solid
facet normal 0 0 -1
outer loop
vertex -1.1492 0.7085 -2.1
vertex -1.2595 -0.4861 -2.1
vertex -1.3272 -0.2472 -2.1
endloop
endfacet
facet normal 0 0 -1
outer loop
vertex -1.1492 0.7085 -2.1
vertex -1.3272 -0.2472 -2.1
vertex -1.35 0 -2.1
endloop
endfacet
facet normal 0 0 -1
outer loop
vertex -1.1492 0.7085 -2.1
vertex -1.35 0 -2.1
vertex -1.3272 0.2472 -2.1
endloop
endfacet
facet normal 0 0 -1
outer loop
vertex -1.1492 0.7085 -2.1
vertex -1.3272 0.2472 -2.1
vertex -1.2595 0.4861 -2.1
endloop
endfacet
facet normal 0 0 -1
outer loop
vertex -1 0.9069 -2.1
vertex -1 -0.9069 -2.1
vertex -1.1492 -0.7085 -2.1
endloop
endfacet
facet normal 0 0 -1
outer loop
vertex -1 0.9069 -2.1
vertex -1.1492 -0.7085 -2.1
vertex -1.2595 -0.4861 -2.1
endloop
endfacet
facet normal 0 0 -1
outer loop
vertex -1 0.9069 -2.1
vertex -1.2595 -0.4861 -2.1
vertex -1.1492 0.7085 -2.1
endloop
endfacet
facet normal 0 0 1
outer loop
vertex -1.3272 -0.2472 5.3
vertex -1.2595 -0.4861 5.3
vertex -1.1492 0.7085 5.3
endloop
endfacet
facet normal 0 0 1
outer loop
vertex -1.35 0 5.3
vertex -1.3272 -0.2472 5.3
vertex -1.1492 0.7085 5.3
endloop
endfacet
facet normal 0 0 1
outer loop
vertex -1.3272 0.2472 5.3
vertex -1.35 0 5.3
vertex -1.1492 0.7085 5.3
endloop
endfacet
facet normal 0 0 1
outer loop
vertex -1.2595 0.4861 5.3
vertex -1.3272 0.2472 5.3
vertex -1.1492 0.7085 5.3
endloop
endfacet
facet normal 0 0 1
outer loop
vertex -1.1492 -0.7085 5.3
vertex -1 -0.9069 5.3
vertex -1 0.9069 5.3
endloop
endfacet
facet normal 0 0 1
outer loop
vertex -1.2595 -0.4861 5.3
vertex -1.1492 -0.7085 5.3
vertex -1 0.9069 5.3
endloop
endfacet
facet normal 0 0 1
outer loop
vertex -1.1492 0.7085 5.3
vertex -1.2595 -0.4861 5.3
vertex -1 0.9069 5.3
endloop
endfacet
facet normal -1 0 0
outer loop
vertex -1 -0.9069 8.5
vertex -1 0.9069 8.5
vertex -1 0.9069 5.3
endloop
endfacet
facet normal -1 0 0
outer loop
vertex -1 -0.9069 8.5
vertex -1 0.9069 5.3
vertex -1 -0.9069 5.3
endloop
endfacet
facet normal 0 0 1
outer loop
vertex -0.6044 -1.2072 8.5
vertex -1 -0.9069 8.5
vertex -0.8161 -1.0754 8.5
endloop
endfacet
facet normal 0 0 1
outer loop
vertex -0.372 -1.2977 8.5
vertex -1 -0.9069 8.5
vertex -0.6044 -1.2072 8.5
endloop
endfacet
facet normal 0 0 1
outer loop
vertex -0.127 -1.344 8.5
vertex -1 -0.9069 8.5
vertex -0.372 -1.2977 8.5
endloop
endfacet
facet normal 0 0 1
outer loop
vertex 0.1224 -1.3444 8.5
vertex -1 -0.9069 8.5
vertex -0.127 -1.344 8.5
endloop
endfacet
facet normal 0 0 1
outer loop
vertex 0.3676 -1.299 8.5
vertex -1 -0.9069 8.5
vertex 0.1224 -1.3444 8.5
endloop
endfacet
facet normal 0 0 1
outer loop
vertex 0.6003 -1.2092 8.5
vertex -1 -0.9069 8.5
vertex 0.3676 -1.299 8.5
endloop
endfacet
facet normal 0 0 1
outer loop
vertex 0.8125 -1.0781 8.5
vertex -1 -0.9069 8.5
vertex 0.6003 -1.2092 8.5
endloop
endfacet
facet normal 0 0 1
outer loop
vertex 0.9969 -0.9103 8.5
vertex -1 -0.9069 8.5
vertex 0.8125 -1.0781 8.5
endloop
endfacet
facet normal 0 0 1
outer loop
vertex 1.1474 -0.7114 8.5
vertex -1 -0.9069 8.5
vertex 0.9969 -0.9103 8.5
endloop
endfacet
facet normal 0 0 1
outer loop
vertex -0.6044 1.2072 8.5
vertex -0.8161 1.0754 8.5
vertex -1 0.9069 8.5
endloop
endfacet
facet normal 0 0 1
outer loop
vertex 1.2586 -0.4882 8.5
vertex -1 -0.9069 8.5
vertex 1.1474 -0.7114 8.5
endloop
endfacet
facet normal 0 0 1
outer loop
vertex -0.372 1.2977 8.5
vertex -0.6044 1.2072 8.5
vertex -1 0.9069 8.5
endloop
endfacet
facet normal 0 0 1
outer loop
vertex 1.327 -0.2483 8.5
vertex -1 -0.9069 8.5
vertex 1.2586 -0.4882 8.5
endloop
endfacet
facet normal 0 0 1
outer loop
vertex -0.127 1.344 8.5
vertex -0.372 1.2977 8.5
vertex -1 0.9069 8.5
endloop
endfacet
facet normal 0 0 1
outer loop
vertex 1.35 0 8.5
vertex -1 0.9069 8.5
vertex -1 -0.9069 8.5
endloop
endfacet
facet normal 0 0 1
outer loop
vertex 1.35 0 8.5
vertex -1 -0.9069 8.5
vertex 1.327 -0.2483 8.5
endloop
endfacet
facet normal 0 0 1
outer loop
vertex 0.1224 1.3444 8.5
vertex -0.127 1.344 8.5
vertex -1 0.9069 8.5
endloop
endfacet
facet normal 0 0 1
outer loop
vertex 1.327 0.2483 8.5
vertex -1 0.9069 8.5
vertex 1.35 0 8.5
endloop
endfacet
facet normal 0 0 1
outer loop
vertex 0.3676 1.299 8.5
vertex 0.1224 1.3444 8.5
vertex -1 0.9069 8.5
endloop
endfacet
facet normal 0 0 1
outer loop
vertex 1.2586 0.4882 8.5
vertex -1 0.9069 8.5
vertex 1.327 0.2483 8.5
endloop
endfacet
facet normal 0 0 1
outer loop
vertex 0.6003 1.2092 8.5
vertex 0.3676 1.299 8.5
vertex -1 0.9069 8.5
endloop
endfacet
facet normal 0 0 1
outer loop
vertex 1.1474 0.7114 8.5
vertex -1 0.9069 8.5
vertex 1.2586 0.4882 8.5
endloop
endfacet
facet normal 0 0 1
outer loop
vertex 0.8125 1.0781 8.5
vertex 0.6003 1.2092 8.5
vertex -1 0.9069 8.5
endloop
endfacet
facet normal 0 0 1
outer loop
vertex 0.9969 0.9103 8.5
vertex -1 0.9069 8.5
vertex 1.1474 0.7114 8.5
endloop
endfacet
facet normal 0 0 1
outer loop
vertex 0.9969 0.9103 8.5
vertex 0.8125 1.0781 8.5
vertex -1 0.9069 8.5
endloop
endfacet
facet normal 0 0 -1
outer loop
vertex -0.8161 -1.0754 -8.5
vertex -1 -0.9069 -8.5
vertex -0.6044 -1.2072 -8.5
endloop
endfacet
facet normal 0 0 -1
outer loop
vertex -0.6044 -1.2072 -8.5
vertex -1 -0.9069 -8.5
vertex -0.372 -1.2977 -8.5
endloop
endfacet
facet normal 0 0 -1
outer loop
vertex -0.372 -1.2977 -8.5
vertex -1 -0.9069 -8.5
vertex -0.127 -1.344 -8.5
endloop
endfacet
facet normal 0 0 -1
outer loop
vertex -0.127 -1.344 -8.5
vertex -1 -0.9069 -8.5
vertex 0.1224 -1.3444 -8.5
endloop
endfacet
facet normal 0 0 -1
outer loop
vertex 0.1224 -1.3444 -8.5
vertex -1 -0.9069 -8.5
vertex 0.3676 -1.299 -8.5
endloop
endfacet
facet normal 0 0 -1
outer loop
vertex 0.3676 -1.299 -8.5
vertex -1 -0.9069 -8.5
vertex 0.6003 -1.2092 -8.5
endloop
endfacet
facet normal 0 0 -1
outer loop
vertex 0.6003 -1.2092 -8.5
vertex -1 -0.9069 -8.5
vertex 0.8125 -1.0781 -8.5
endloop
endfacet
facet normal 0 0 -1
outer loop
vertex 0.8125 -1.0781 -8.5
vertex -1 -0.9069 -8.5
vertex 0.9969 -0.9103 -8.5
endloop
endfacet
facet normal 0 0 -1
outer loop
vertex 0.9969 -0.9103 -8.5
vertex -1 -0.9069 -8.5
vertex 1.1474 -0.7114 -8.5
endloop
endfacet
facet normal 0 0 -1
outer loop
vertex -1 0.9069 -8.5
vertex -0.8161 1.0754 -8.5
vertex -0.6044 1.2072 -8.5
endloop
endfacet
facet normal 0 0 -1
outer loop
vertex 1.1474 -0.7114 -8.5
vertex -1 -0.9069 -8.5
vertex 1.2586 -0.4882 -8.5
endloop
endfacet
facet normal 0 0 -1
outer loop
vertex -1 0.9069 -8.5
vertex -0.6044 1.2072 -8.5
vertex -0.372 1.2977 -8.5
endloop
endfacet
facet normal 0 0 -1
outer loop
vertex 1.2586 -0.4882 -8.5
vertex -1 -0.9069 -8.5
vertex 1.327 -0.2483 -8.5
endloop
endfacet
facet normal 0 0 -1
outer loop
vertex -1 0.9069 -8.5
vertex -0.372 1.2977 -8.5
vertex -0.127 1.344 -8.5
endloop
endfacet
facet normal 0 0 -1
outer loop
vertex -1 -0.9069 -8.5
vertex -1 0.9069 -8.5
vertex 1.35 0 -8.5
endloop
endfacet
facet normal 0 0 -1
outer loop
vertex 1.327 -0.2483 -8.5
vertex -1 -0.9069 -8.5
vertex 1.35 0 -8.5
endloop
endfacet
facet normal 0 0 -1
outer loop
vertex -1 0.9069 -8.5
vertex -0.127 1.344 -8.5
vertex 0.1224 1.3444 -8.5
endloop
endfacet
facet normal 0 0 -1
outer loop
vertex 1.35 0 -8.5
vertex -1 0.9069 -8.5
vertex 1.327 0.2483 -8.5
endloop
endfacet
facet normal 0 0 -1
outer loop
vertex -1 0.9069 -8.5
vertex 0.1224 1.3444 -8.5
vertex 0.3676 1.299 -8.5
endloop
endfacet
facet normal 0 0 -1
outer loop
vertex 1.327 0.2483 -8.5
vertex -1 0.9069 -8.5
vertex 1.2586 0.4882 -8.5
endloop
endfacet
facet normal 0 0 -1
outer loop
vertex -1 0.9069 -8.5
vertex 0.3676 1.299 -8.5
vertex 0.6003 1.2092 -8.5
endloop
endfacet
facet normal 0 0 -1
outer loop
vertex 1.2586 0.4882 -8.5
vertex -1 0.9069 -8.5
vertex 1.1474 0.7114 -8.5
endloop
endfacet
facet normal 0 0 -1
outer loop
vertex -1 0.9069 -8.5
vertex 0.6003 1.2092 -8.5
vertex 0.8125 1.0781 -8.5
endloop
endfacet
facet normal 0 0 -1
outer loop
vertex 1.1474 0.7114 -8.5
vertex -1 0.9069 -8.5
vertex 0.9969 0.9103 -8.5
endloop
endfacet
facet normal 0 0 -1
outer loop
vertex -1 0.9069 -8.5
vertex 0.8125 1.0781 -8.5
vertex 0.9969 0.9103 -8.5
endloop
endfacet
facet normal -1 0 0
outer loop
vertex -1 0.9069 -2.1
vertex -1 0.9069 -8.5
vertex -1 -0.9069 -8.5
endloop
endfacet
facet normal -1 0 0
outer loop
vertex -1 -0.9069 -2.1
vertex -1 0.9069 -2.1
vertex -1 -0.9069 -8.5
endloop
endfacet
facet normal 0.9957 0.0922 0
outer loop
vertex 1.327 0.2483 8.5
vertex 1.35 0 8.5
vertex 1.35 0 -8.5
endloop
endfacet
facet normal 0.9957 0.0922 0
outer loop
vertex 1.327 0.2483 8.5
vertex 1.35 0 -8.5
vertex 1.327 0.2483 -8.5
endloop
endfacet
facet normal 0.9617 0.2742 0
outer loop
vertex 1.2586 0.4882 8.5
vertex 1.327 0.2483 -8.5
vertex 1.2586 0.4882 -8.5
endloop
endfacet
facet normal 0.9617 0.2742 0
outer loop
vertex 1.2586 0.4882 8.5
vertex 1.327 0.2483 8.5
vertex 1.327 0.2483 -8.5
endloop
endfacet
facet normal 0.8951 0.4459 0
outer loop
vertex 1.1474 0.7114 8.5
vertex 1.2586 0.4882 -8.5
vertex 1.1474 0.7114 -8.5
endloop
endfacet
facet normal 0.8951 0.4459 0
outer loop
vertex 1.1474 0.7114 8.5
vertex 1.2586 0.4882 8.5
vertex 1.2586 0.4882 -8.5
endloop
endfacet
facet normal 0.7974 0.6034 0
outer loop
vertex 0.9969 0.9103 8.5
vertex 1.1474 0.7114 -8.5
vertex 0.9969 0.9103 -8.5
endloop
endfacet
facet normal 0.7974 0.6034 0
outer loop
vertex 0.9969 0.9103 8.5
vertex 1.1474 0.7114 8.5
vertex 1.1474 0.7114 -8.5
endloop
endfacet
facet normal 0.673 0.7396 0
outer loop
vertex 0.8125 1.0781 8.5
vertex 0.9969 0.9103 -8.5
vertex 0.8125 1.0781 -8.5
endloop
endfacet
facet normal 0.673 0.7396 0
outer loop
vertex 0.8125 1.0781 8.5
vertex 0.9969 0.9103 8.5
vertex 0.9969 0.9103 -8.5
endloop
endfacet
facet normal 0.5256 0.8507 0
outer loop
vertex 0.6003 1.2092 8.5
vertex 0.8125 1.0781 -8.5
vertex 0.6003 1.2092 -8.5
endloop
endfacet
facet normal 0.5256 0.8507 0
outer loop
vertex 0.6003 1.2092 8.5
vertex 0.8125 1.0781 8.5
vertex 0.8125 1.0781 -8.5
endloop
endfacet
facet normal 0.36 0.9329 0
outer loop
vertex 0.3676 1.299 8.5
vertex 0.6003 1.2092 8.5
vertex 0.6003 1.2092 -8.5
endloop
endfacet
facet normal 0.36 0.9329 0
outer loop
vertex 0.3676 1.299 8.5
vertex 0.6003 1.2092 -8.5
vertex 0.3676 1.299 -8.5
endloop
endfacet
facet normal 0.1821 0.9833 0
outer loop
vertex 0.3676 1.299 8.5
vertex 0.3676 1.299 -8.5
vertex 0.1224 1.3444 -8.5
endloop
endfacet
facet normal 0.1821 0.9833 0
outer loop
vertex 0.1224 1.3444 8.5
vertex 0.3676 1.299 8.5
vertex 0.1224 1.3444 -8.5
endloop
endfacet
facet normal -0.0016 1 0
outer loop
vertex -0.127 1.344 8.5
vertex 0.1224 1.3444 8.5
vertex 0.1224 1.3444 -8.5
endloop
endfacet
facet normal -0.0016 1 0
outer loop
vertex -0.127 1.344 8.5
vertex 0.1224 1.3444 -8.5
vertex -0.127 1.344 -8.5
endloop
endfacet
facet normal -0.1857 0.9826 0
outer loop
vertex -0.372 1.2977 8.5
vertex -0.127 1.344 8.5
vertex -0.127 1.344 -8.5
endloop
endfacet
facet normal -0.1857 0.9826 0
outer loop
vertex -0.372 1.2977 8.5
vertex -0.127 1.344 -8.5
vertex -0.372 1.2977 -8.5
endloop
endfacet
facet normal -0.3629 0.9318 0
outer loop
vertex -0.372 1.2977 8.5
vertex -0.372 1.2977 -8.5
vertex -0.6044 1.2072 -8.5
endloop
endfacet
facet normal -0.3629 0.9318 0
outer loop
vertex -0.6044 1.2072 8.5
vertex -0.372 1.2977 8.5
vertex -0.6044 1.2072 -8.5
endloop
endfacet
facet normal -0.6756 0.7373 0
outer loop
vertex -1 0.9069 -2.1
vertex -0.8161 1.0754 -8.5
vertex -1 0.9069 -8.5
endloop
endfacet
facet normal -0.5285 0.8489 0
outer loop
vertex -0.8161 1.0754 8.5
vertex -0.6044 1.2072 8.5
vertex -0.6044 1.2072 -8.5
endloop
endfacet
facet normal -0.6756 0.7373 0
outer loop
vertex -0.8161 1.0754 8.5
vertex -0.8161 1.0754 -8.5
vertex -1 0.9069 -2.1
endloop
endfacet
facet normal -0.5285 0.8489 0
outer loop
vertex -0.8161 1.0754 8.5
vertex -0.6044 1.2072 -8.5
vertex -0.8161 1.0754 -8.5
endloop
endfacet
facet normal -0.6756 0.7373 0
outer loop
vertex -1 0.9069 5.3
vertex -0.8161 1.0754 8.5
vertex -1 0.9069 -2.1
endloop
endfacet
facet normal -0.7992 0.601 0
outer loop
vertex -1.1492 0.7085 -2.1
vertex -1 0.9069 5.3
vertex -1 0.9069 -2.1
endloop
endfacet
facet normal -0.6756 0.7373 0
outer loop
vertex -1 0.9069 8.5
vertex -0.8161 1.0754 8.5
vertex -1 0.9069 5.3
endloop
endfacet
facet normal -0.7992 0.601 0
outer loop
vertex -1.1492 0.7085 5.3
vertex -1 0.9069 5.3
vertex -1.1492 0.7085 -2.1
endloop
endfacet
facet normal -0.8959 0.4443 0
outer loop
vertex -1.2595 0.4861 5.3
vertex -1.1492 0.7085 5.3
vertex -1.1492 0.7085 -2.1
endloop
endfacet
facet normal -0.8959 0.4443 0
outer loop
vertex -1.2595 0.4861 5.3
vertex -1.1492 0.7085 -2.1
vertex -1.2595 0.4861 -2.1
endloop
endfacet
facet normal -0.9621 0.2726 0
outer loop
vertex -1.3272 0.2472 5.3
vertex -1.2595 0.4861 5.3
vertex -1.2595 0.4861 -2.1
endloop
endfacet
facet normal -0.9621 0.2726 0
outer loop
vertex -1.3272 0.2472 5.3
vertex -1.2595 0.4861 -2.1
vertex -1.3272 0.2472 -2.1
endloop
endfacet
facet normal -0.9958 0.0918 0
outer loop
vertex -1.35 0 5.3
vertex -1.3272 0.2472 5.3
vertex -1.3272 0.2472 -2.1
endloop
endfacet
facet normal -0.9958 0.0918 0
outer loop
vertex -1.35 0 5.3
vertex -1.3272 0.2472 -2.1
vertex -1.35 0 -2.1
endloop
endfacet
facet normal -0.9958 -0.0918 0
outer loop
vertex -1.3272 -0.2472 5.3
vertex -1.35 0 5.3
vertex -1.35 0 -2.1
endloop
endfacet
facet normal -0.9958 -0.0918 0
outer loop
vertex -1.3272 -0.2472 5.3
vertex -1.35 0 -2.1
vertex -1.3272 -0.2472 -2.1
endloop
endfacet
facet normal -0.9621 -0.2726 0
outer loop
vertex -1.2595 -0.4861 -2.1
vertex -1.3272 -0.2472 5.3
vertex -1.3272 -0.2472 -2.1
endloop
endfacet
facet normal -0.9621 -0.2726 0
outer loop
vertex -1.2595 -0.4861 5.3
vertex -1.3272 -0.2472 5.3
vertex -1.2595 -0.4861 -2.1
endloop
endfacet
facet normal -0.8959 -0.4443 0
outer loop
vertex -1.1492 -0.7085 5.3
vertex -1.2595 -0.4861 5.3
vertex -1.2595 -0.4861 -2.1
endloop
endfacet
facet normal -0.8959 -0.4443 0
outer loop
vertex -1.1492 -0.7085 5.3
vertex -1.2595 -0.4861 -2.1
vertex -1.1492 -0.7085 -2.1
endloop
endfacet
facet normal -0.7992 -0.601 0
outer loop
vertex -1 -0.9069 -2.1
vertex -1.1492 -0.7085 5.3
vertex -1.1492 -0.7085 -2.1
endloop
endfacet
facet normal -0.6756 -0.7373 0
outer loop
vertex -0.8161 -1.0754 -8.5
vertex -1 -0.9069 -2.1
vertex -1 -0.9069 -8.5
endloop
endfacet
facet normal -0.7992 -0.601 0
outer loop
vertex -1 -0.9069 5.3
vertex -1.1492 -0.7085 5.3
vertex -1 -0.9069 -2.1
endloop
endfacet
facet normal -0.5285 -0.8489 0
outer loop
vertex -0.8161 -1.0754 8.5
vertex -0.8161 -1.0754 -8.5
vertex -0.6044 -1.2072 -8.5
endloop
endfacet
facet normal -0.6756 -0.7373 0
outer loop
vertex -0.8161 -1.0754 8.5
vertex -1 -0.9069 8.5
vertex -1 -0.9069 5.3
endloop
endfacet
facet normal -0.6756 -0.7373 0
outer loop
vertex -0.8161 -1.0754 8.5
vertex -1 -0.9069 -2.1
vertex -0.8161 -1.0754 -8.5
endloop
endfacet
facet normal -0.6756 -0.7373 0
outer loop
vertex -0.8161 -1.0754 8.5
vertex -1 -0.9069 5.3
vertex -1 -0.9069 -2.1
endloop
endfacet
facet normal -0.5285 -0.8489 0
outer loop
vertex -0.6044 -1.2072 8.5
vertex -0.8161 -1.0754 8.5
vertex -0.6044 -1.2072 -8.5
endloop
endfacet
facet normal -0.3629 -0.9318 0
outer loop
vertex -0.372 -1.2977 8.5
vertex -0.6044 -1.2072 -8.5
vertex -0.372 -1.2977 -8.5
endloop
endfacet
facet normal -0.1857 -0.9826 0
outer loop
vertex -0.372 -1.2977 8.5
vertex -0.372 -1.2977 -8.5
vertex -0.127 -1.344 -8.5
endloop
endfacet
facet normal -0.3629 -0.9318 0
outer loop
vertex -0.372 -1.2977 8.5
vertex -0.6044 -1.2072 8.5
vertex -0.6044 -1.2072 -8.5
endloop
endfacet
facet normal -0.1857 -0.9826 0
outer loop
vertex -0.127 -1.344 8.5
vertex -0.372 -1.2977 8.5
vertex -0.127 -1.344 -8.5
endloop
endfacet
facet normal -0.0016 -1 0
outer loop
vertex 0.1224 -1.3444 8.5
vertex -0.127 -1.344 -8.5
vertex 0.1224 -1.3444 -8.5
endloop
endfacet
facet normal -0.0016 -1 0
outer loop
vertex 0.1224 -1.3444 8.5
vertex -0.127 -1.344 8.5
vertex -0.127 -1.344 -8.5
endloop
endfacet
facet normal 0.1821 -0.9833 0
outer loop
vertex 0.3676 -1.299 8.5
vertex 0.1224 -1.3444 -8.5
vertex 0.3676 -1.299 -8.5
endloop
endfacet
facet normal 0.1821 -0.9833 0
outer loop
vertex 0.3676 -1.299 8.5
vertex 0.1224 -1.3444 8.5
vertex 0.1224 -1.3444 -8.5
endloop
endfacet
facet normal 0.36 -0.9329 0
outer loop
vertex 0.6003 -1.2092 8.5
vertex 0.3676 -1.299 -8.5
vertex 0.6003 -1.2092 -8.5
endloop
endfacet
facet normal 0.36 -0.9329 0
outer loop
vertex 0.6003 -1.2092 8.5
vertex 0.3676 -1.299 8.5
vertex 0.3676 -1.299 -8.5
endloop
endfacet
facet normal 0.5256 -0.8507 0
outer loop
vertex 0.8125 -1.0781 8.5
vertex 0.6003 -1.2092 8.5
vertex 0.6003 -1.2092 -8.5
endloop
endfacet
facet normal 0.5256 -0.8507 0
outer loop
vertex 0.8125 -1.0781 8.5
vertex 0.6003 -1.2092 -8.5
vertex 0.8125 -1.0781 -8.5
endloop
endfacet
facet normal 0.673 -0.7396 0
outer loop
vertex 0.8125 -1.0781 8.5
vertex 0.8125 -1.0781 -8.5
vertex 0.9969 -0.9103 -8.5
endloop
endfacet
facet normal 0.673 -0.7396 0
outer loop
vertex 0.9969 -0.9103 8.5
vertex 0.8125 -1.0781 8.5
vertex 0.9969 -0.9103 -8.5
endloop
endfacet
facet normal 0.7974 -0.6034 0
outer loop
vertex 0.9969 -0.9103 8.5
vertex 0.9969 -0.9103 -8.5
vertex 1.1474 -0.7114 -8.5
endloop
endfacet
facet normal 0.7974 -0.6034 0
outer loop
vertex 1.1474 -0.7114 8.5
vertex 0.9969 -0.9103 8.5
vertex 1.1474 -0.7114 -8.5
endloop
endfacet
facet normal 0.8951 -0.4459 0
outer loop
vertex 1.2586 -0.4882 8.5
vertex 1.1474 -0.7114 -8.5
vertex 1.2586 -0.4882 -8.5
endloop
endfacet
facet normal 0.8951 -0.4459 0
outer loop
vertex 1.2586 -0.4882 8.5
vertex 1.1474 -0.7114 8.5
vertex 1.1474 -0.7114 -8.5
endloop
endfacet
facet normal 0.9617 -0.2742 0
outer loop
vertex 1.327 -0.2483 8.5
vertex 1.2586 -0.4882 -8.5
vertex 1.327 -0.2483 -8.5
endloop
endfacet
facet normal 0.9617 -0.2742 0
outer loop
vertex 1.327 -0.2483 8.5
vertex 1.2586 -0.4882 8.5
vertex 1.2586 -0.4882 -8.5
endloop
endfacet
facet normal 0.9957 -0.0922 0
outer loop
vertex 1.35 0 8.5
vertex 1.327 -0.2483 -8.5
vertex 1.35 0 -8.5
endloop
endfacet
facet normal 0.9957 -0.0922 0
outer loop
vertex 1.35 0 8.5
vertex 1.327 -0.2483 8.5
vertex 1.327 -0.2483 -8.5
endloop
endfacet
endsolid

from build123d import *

# Parameters (mm, degrees)
SKETCH2_R           = 1.35
BOSS_EXTRUDE1_DEPTH = 8.5
CUT_EXTRUDE1_DEPTH  = 6.4
CUT_EXTRUDE2_DEPTH  = 3.2


with BuildPart() as part:
    # Sketch2 → Boss-Extrude1 (new body, symmetric)
    with BuildSketch(Plane.XY):
        Circle(SKETCH2_R)
    extrude(amount=BOSS_EXTRUDE1_DEPTH, both=True)

    # Sketch4 → Cut-Extrude1 (cut)
    with BuildSketch(Plane(origin=(0, 0, -8.5), x_dir=(-1, 0, 0), z_dir=(0, 0, -1))):
        with BuildLine():
            Line((1, 0.906917857), (1, -0.906917857))
            ThreePointArc((1, -0.906917857), (1.35, 0), (1, 0.906917857))
        make_face()
    extrude(amount=-CUT_EXTRUDE1_DEPTH, mode=Mode.SUBTRACT)

    # Sketch5 → Cut-Extrude2 (cut)
    with BuildSketch(Plane.XY.offset(8.5)):
        with BuildLine():
            Line((-1, 0.906917857), (-1, -0.906917857))
            ThreePointArc((-1, -0.906917857), (-1.35, 0), (-1, 0.906917857))
        make_face()
    extrude(amount=-CUT_EXTRUDE2_DEPTH, mode=Mode.SUBTRACT)


solid = part.part
